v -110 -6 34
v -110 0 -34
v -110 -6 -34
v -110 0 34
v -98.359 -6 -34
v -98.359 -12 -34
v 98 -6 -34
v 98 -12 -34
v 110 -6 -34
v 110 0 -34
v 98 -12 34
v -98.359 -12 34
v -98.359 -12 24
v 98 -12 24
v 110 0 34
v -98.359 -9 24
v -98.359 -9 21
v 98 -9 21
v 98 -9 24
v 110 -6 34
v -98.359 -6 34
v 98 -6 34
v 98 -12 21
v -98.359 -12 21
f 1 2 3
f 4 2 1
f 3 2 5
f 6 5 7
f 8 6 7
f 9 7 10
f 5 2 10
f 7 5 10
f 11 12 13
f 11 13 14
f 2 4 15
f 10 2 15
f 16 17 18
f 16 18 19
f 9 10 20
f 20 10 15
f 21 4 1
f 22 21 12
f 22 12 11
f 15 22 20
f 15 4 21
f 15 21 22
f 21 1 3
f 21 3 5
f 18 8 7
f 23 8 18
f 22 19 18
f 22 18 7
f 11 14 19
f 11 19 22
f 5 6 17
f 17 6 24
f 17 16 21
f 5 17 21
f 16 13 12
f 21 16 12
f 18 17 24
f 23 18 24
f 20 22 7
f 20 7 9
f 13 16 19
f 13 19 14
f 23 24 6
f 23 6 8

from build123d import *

# Parameters (mm, degrees)
F0_W     = 220
F0_H     = 68
F1_DEPTH = 12
F2_W     = 3
F2_H     = 3
F3_DEPTH = 300
F4_W     = 12
F4_H     = 68
F5_DEPTH = 6


with BuildPart() as f1:
    # F0 (on Front) → F1 (new body)
    with BuildSketch(Plane.XZ):
        Rectangle(F0_W, F0_H)
    extrude(amount=F1_DEPTH)

    # F2 (on face) → F3 (cut)
    with BuildSketch(Plane(origin=(-110, 0, 0), x_dir=(0, -1, 0), z_dir=(-1, 0, 0))):
        with Locations((10.5, 22.5)):
            Rectangle(F2_W, F2_H)
    extrude(amount=-F3_DEPTH, mode=Mode.SUBTRACT)

    # F4 (on face) → F5 (cut)
    with BuildSketch(Plane.XZ.offset(12)):
        with Locations((-104.358618, 0)):
            Rectangle(F4_W, F4_H)
        with Locations((104, 0)):
            Rectangle(F4_W, F4_H)
    extrude(amount=-F5_DEPTH, mode=Mode.SUBTRACT)


solid = f1.part
